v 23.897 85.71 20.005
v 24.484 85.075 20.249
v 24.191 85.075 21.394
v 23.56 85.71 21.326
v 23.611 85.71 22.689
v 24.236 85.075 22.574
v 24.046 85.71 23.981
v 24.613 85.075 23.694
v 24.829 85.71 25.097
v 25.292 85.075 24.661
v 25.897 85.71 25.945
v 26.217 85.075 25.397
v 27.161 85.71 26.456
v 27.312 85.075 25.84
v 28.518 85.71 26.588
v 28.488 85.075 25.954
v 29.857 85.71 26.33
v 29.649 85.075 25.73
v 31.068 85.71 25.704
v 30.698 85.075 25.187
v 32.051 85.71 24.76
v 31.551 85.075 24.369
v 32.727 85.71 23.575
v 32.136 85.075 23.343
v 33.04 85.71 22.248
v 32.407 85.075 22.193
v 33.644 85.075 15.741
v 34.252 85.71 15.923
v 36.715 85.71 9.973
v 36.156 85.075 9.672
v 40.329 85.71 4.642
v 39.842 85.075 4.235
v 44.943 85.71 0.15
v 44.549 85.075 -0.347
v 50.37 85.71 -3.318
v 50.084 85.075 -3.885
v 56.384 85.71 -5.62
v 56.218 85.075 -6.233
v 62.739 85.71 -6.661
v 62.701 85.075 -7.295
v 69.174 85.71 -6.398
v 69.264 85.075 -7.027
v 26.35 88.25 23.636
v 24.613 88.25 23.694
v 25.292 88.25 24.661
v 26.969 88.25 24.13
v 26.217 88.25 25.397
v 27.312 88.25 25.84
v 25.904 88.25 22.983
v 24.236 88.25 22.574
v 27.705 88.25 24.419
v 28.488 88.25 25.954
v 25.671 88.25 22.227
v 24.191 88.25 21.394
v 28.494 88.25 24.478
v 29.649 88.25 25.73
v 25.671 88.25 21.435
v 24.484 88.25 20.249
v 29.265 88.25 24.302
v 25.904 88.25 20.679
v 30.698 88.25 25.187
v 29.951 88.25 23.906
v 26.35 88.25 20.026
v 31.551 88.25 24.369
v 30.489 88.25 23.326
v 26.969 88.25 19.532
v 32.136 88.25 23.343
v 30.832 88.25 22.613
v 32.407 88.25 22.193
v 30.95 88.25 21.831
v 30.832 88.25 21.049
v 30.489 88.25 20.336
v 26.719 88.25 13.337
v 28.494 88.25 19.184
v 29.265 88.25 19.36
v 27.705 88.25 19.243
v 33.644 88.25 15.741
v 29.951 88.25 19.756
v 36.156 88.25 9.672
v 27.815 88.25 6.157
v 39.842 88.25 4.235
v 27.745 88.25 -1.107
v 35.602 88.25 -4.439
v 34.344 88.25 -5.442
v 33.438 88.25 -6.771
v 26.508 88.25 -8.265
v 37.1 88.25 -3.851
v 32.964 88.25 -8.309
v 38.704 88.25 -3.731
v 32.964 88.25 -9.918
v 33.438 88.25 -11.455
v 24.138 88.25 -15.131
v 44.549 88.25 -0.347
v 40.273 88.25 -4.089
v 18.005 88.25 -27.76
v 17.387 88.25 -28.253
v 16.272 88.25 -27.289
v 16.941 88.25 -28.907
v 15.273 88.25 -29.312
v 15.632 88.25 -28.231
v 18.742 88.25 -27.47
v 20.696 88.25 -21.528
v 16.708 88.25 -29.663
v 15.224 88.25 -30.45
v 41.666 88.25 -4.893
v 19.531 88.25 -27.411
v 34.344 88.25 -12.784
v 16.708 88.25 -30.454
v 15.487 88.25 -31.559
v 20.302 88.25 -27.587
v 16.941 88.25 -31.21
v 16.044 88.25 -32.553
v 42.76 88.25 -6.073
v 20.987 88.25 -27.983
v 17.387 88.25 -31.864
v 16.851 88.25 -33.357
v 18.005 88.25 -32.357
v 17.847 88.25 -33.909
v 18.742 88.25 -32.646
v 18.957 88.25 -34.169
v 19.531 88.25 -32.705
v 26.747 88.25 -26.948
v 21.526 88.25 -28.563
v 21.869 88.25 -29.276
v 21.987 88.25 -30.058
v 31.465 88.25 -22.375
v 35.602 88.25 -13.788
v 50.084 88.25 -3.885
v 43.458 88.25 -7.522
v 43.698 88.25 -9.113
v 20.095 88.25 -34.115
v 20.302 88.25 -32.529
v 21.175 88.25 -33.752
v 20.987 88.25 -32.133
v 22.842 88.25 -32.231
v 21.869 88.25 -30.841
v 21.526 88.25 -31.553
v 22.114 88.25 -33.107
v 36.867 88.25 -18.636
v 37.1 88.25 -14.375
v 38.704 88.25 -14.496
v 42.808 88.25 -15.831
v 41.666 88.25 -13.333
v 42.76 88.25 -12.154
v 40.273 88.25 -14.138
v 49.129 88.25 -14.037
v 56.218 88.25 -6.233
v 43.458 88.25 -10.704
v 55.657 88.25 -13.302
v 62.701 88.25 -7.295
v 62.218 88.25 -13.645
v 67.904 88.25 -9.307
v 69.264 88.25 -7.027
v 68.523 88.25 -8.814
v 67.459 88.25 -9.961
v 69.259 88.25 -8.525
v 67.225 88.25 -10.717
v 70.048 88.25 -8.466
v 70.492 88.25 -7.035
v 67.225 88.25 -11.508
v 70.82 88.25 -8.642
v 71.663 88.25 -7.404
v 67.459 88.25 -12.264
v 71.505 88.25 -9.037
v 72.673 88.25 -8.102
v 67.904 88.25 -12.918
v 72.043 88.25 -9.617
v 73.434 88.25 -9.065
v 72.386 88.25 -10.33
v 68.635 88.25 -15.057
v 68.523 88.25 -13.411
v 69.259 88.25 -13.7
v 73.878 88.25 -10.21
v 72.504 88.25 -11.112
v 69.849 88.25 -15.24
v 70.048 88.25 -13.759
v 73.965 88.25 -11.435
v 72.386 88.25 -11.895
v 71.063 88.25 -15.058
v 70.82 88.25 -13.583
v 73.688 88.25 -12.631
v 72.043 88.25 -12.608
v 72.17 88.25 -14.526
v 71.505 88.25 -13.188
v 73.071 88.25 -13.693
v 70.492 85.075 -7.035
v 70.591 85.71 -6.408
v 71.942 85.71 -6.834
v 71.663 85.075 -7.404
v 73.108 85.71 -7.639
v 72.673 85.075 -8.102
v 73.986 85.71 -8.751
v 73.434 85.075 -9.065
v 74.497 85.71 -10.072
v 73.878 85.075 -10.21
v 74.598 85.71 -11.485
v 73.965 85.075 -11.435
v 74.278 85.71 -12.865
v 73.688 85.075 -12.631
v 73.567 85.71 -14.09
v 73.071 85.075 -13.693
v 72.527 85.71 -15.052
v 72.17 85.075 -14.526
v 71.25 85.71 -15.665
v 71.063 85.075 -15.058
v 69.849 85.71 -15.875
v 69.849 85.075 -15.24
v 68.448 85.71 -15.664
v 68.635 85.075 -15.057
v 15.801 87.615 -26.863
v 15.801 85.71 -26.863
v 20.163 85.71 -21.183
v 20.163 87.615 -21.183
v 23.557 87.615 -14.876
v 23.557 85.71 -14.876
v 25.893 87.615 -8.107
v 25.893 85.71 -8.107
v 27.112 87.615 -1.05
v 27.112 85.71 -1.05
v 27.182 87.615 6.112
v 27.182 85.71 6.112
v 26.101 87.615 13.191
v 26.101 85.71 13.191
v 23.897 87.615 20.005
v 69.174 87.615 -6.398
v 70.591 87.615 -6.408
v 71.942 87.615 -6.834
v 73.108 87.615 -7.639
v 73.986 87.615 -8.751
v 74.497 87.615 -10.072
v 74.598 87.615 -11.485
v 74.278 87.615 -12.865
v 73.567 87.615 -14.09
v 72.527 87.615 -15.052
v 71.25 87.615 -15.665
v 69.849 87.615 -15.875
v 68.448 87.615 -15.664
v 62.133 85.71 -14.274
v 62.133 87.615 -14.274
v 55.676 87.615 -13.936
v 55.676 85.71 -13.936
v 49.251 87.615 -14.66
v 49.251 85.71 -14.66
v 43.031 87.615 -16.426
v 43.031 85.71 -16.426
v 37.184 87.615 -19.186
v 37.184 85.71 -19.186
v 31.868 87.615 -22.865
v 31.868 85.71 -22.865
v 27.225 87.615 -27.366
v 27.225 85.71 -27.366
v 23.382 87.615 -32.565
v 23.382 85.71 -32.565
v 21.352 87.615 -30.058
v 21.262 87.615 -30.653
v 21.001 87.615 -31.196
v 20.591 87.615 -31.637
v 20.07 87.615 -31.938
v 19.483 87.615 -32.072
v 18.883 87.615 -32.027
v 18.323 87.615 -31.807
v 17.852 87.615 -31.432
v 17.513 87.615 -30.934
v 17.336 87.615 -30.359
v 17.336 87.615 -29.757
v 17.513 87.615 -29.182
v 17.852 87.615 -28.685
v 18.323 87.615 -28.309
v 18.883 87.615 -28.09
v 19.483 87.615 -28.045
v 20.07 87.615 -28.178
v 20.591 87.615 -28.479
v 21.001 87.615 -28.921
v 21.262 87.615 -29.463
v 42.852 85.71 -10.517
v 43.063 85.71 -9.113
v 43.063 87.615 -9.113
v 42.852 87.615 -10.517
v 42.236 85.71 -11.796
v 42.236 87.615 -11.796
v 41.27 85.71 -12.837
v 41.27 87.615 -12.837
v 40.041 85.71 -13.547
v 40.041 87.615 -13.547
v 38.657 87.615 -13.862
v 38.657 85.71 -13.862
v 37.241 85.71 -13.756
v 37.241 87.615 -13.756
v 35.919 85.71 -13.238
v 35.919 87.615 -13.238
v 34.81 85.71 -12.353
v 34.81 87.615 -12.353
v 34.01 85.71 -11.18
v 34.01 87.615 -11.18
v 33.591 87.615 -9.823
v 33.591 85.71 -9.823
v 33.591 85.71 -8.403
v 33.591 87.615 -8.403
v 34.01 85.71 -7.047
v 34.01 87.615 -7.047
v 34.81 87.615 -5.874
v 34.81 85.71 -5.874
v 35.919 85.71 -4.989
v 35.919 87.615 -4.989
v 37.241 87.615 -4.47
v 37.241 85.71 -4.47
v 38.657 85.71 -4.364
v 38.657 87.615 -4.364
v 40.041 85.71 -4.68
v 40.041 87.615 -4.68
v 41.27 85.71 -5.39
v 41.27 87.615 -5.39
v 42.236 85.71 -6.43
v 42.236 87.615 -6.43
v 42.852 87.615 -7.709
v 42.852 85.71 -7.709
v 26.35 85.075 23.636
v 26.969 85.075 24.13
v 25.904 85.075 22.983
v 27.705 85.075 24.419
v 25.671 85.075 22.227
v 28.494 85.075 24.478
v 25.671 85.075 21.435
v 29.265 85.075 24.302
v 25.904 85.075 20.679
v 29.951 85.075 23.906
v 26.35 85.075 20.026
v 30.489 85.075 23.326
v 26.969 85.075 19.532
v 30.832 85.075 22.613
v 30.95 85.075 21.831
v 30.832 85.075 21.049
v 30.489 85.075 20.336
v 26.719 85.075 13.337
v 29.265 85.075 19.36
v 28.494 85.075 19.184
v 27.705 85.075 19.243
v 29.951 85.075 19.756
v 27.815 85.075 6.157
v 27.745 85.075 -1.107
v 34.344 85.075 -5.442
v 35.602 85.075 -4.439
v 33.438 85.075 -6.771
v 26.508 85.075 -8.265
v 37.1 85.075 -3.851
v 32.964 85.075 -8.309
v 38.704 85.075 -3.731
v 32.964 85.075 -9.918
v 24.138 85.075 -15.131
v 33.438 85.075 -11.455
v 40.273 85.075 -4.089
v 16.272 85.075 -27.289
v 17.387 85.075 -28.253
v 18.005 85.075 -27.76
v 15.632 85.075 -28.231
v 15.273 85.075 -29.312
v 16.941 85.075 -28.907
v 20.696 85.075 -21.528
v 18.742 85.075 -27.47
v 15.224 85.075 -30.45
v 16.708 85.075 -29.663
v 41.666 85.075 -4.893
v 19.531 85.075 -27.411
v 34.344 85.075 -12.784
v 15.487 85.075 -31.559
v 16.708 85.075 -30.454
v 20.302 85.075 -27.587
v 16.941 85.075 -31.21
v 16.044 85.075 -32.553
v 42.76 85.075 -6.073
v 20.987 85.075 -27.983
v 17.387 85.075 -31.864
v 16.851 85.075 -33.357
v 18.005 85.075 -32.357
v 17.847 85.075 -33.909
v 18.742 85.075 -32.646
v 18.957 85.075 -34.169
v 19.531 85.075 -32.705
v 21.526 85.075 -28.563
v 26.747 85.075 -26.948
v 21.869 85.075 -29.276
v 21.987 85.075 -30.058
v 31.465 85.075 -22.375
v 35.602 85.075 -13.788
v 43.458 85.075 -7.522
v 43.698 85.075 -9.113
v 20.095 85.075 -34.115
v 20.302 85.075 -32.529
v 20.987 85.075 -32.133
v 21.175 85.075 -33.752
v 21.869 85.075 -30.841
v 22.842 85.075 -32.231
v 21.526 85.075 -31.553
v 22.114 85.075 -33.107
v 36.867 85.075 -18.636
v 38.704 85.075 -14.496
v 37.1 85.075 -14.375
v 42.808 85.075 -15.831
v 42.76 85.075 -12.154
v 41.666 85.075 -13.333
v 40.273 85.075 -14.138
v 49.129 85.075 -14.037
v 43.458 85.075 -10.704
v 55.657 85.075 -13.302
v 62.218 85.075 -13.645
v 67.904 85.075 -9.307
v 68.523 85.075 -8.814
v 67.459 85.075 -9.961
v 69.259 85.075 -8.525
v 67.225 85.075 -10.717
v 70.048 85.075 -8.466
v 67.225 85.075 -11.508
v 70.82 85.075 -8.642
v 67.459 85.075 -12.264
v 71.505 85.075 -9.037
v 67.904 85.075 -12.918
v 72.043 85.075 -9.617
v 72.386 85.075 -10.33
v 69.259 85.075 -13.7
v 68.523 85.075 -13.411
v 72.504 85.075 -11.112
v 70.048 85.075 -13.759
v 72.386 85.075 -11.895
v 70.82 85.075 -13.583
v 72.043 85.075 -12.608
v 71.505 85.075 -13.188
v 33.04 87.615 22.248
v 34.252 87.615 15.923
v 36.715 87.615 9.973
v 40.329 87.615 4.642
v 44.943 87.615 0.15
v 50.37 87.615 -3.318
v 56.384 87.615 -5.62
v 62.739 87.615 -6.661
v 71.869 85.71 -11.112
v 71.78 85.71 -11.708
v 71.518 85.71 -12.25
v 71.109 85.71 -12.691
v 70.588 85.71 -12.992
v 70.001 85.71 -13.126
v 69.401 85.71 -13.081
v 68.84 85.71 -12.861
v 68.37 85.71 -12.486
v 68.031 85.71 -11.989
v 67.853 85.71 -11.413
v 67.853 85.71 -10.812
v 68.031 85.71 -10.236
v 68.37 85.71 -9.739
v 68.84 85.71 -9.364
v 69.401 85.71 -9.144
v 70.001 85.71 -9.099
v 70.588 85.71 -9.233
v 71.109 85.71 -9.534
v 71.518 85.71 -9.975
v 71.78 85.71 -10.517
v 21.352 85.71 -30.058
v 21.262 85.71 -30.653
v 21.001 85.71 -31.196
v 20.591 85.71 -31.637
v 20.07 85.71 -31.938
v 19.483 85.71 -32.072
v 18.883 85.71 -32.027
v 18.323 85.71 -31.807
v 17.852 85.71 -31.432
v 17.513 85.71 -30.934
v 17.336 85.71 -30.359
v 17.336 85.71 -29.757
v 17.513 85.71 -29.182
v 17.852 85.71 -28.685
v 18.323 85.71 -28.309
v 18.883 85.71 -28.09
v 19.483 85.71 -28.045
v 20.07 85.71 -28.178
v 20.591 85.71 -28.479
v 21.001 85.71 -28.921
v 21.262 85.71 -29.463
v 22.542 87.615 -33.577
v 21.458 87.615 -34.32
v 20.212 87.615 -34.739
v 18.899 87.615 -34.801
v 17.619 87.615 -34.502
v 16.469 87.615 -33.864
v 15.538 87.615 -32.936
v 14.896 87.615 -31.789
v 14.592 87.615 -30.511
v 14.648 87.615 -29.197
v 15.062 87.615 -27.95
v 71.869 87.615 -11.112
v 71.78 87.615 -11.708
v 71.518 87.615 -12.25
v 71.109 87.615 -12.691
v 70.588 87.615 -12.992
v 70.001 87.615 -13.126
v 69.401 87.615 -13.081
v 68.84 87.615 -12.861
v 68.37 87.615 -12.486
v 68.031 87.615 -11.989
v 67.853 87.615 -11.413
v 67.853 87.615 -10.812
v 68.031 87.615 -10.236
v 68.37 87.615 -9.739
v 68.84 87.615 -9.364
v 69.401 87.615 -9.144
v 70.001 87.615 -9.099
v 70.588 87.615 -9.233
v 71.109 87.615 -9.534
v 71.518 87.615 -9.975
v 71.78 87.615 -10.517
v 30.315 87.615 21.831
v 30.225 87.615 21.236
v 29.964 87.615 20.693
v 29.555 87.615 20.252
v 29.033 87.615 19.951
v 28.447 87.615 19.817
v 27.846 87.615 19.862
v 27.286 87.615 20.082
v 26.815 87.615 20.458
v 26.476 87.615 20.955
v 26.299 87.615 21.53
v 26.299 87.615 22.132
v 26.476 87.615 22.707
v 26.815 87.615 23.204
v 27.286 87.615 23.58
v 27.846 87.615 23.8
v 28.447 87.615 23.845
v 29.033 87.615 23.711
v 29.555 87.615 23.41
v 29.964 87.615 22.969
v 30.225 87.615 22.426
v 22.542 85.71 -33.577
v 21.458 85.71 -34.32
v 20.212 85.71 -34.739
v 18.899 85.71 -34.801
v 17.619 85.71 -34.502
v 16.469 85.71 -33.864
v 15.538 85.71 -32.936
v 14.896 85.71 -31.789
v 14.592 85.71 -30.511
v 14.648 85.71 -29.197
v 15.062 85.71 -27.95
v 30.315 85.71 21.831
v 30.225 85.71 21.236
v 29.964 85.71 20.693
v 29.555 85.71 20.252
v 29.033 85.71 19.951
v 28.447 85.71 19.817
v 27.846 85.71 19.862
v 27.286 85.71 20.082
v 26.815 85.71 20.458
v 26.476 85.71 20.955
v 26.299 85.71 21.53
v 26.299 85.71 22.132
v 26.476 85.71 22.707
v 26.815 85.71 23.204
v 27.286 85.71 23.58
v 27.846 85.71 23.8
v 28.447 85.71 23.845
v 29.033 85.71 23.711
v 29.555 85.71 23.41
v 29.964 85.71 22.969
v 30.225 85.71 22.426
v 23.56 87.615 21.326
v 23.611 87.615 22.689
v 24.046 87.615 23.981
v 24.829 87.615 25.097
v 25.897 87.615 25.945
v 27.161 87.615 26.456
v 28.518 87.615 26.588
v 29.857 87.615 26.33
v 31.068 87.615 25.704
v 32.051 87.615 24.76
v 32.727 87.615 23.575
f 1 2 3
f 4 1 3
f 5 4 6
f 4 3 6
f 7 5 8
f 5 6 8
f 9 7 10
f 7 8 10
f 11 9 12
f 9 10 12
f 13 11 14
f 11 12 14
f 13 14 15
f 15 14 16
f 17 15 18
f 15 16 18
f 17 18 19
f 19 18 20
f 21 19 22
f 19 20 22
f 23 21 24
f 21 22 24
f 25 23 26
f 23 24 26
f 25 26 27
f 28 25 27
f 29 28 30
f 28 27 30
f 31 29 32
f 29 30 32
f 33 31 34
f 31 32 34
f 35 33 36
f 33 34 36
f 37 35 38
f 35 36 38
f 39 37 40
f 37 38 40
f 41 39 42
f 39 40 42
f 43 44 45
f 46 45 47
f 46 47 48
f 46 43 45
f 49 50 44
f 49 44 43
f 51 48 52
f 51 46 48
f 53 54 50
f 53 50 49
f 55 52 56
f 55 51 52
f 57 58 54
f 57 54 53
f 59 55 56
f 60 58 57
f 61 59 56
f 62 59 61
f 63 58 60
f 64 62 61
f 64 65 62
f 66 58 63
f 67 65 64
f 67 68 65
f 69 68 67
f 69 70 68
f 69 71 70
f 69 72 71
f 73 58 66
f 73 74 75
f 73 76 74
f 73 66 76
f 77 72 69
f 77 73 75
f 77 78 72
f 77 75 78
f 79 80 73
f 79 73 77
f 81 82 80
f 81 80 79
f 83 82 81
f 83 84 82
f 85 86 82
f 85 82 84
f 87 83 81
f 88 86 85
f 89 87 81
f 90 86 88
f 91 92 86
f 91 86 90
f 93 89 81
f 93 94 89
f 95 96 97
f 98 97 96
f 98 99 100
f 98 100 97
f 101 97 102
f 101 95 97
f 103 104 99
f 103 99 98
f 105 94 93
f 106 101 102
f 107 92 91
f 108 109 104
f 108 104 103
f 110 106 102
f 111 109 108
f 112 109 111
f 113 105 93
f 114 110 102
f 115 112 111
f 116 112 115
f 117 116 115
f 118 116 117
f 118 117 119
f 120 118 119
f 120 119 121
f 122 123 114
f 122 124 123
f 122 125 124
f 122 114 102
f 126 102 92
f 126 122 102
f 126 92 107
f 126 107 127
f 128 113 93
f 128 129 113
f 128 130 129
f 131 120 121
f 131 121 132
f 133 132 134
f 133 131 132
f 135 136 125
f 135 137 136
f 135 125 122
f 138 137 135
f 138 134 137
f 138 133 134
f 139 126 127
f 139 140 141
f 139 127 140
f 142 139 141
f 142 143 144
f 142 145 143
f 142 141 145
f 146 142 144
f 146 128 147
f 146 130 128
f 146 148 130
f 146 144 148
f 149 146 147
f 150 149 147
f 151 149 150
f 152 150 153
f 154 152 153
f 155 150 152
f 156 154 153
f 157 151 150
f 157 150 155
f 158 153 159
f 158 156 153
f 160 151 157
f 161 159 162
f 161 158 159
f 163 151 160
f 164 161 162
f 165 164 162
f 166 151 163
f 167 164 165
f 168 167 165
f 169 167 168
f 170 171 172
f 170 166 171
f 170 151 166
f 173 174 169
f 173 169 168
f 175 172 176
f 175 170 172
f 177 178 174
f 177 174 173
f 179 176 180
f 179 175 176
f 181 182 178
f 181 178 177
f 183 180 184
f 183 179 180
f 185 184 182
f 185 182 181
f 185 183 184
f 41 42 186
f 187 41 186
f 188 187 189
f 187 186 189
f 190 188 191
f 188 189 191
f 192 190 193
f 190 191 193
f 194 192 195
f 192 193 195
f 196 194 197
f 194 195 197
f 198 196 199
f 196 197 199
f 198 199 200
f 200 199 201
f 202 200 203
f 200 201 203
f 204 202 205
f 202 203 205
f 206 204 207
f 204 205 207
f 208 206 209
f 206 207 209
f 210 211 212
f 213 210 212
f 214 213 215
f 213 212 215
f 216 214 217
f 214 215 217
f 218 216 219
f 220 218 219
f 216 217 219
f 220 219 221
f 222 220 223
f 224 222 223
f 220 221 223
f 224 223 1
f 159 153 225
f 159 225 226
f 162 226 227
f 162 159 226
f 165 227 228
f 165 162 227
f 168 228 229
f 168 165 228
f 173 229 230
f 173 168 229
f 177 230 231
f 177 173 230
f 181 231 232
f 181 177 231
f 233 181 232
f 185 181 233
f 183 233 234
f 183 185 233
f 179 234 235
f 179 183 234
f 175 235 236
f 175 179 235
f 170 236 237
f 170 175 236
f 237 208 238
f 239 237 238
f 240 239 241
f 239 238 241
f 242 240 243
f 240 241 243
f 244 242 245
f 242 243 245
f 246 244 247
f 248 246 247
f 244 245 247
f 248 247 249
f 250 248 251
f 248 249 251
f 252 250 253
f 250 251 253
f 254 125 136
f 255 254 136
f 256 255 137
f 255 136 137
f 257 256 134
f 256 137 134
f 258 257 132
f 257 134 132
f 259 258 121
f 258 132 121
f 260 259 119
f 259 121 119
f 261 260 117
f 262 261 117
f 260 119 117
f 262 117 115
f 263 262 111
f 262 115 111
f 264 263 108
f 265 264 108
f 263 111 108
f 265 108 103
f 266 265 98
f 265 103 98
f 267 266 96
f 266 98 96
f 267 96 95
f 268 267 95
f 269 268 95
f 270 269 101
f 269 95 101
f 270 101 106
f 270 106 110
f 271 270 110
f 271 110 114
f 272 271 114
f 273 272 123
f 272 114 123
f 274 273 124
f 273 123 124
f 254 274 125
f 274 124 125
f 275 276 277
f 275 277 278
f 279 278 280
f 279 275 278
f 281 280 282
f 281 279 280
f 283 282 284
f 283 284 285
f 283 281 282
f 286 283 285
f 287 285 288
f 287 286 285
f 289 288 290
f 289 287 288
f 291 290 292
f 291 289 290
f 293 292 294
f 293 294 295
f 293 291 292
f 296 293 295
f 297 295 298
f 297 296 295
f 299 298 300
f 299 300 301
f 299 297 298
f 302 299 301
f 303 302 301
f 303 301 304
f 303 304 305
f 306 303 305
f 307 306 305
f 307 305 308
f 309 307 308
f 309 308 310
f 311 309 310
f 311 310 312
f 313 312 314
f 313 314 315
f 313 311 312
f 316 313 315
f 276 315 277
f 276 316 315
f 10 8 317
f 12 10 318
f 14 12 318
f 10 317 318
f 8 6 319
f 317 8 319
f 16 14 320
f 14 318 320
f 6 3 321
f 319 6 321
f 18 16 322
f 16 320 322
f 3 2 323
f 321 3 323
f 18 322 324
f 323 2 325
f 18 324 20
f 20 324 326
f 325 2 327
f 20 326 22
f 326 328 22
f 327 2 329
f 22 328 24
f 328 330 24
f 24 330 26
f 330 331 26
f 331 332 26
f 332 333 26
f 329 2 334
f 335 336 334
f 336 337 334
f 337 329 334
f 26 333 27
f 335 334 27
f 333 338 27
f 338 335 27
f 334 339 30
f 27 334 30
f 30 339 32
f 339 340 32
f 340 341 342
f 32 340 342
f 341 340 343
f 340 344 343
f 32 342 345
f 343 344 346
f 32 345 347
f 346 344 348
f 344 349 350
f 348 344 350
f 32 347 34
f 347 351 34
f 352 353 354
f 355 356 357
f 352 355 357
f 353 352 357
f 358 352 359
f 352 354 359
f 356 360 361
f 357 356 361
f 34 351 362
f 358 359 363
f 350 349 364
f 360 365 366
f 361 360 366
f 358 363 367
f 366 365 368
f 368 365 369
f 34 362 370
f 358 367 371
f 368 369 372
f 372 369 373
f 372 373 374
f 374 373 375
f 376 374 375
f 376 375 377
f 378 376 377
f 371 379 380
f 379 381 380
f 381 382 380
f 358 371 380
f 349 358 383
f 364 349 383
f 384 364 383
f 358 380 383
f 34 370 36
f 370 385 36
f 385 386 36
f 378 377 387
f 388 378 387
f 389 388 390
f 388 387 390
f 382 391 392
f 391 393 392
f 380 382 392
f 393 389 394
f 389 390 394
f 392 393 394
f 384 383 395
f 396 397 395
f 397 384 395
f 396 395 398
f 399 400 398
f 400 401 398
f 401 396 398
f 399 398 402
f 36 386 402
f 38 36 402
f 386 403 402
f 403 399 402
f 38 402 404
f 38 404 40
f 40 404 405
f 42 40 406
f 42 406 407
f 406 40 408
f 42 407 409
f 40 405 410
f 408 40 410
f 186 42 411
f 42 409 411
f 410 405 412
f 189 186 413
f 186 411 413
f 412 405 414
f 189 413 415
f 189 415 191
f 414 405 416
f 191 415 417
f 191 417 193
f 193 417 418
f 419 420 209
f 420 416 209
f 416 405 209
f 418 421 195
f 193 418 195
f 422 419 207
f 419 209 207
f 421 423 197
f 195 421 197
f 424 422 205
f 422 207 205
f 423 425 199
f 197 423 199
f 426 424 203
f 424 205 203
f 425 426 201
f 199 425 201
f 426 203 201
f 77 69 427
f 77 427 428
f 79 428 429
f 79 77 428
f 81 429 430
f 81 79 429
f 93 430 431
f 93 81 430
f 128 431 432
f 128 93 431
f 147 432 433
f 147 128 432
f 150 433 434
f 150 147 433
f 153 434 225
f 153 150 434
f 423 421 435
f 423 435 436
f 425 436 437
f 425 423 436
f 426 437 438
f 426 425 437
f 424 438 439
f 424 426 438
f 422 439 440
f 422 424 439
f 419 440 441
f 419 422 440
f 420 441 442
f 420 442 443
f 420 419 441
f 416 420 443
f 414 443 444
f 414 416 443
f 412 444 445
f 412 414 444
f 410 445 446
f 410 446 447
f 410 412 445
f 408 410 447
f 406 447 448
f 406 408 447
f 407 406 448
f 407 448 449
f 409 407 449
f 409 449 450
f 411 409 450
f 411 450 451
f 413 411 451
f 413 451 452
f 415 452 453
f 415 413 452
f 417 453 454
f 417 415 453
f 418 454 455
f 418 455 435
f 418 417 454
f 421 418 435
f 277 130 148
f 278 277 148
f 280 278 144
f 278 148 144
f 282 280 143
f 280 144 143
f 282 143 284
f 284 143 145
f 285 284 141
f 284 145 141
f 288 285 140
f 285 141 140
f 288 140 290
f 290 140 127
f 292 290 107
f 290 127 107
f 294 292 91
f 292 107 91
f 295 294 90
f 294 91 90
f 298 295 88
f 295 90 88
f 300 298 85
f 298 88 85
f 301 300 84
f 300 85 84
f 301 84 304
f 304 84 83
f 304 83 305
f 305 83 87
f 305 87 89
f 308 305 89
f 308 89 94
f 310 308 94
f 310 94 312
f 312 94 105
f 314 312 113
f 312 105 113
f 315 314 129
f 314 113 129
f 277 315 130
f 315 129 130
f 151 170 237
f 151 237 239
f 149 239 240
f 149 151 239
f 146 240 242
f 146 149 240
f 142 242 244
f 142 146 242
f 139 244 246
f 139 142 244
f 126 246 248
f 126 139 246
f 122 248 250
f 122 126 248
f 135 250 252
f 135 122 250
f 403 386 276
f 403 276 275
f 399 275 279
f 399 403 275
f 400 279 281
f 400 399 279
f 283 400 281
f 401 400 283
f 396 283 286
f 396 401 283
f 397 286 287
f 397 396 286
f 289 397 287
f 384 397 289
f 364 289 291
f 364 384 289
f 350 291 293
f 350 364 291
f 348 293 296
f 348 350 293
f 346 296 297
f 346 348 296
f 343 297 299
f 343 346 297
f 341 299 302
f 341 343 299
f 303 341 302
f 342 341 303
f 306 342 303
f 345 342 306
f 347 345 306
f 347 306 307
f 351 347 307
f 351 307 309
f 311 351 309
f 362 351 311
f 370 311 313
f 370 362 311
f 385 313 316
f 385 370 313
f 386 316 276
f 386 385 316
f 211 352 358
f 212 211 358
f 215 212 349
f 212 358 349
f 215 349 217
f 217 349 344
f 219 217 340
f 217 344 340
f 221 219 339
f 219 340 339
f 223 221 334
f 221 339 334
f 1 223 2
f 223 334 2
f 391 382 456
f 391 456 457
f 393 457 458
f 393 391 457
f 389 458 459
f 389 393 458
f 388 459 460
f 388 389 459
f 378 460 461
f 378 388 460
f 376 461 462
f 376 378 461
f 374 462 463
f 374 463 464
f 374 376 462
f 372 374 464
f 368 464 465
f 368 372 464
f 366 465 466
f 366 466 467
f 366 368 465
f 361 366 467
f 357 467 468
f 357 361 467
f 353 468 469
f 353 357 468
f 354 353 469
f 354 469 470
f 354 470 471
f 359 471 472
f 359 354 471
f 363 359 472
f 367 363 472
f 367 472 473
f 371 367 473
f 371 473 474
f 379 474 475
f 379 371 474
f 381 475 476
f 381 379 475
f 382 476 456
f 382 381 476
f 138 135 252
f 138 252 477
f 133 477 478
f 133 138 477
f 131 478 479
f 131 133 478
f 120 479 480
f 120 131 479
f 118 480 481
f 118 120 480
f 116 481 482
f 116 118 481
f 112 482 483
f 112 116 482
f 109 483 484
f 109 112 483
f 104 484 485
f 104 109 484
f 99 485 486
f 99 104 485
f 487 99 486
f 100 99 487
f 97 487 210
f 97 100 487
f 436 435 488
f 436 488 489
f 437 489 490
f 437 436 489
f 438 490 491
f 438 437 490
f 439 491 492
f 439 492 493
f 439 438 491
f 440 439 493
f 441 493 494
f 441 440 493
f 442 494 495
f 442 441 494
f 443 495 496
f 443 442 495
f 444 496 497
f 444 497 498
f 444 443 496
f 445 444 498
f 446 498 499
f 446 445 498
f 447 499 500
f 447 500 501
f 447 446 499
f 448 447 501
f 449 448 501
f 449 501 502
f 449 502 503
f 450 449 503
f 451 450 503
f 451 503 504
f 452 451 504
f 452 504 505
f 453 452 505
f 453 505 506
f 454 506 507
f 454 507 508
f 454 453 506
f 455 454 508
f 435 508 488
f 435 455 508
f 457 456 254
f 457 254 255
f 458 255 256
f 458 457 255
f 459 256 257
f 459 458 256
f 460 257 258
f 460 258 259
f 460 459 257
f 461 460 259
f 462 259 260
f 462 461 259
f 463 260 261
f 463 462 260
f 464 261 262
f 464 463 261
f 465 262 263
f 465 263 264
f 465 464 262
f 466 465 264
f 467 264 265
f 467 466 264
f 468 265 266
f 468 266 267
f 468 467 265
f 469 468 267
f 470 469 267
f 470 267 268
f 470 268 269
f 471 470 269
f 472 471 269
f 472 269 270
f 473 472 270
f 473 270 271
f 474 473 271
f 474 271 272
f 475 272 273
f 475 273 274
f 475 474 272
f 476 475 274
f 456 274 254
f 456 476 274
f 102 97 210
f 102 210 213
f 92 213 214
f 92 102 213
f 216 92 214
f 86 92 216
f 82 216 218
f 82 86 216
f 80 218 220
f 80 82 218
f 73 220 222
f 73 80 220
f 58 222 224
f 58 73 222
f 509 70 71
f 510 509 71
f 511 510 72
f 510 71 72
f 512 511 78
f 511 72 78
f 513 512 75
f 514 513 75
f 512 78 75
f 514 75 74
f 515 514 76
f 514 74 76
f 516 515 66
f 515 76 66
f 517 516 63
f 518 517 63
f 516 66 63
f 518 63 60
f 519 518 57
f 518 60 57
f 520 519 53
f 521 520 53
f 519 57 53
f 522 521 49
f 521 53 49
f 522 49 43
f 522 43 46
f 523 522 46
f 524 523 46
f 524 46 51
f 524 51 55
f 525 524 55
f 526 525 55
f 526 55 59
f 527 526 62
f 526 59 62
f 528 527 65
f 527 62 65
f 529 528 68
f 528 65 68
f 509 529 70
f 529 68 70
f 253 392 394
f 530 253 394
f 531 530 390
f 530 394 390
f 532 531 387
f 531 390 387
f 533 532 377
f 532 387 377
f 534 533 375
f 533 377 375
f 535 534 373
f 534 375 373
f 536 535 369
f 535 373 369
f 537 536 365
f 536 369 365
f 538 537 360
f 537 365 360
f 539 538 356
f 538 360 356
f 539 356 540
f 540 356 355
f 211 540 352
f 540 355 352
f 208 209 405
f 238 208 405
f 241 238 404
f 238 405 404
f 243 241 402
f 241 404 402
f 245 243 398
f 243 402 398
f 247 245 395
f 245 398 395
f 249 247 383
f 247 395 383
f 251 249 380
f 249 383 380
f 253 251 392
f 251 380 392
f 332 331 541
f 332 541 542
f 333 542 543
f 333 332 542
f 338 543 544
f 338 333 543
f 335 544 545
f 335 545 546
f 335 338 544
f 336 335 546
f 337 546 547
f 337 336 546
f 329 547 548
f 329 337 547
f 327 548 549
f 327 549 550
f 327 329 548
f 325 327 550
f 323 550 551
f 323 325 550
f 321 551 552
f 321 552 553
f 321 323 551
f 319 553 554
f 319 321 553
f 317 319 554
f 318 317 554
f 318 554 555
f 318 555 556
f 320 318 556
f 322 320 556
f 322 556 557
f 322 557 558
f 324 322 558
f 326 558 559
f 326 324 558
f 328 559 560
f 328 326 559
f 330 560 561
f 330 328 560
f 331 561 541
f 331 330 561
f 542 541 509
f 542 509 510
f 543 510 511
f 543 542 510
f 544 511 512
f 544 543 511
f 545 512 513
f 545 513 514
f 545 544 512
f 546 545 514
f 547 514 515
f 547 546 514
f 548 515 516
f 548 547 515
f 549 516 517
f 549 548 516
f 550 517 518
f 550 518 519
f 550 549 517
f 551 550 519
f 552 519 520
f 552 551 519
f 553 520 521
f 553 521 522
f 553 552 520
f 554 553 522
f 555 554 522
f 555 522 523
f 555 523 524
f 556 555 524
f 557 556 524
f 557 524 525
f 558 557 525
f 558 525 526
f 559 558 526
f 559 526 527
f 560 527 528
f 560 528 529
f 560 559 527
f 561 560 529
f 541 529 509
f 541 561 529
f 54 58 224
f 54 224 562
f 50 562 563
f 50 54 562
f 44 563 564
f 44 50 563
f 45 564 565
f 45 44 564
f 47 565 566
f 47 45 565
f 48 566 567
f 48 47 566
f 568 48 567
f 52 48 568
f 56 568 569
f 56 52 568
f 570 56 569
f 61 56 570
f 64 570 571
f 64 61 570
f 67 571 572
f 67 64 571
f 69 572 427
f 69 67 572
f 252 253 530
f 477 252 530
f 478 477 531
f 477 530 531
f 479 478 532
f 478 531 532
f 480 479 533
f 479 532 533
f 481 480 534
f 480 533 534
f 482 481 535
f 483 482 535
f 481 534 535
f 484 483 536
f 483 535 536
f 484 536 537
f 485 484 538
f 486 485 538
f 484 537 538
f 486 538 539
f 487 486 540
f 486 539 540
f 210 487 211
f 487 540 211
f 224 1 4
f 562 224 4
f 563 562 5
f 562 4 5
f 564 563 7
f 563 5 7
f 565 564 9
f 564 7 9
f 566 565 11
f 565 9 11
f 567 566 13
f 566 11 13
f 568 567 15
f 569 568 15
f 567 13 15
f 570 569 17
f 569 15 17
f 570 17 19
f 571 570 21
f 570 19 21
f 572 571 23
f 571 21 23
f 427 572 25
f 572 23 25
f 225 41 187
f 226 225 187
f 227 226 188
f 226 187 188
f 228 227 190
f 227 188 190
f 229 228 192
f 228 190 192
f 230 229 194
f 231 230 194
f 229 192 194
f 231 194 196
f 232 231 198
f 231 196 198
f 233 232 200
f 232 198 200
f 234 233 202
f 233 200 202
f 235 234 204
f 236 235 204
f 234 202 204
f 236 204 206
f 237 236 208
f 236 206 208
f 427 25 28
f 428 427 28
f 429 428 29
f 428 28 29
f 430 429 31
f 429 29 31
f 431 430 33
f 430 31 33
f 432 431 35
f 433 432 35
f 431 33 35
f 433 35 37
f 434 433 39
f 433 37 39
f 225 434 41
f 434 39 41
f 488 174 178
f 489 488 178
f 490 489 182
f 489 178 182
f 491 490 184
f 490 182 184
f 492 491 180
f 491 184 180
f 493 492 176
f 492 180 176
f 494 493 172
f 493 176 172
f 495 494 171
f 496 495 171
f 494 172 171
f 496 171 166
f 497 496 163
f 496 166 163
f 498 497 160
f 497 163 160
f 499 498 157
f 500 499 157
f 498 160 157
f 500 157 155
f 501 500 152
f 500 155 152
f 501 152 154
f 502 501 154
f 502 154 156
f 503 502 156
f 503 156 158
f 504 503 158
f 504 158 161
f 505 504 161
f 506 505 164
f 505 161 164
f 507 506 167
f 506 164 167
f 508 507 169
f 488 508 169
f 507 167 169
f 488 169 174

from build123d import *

# Parameters (mm, degrees)
STOCK_TEATHERED_START                        = 85.075
STOCK_TEATHERED_SWERVE_OUTER_MODUAL_1_OU_R   = 2.0193
STOCK_TEATHERED_SWERVE_OUTER_MODUAL_1_OU_R_2 = 4.7625
STOCK_TEATHERED_SWERVE_OUTER_MODUAL_1_DEPTH  = 3.175
CHAMFER1_SIZE                                = 0.635


# Read off the part's stored shape, not the designer's step: Stock-Teathered Swerve Outer Modual-1
with BuildPart() as part:
    # Stock-Teathered Swerve Outer Modual-1 ou → Stock-Teathered Swerve Outer Modual-1 (new body)
    with BuildSketch(Plane(origin=(0, 0, 0), x_dir=(1, 0, 0), z_dir=(0, 1, 0)).offset(STOCK_TEATHERED_START)):
        with BuildLine():
            ThreePointArc((69.17405827, 6.398212246), (74.59793655, 11.484662283), (68.44777711, 15.663892887))
            ThreePointArc((68.44777711, 15.663892887), (43.031292772, 16.425853008), (23.381787081, 32.565096654))
            ThreePointArc((23.381787081, 32.565096654), (16.469460575, 33.864059213), (15.801303162, 26.862550296))
            ThreePointArc((15.801303162, 26.862550296), (26.644984318, 4.602603852), (23.897134883, -20.005117705))
            ThreePointArc((23.897134883, -20.005117705), (27.16089255, -26.456318028), (33.039902775, -22.248309176))
            ThreePointArc((33.039902775, -22.248309176), (44.943402215, -0.150432703), (69.17405827, 6.398212246))
        make_face()
        with Locations((28.295721181, -21.830999635)):
            Circle(STOCK_TEATHERED_SWERVE_OUTER_MODUAL_1_OU_R, mode=Mode.SUBTRACT)
        with Locations((38.300729341, 9.113233891)):
            Circle(STOCK_TEATHERED_SWERVE_OUTER_MODUAL_1_OU_R_2, mode=Mode.SUBTRACT)
        with Locations((19.332478919, 30.058204223)):
            Circle(STOCK_TEATHERED_SWERVE_OUTER_MODUAL_1_OU_R, mode=Mode.SUBTRACT)
        with Locations((69.85, 11.1125)):
            Circle(STOCK_TEATHERED_SWERVE_OUTER_MODUAL_1_OU_R, mode=Mode.SUBTRACT)
    extrude(amount=STOCK_TEATHERED_SWERVE_OUTER_MODUAL_1_DEPTH)

    # Chamfer1
    chamfer1_edges = [part.edges().sort_by_distance(p)[0] for p in [
        (26.644984318, 88.25, -4.602603852),
        (27.16089255, 88.25, 26.456318028),
        (33.538229341, 85.075, -9.113233891),
        (33.538229341, 88.25, -9.113233891),
        (26.276421181, 85.075, 21.830999635),
        (44.943402215, 88.25, 0.150432703),
        (26.276421181, 88.25, 21.830999635),
        (67.8307, 85.075, -11.1125),
        (74.59793655, 88.25, -11.484662283),
        (67.8307, 88.25, -11.1125),
        (17.313178919, 85.075, -30.058204223),
        (17.313178919, 88.25, -30.058204223),
        (43.031292772, 88.25, -16.425853008),
        (74.59793655, 85.075, -11.484662283),
        (44.943402215, 85.075, 0.150432703),
        (27.16089255, 85.075, 26.456318028),
        (26.644984318, 85.075, -4.602603852),
        (16.469460575, 85.075, -33.864059213),
        (43.031292772, 85.075, -16.425853008),
        (16.469460575, 88.25, -33.864059213),
    ]]
    chamfer(chamfer1_edges, length=CHAMFER1_SIZE)


solid = part.part
